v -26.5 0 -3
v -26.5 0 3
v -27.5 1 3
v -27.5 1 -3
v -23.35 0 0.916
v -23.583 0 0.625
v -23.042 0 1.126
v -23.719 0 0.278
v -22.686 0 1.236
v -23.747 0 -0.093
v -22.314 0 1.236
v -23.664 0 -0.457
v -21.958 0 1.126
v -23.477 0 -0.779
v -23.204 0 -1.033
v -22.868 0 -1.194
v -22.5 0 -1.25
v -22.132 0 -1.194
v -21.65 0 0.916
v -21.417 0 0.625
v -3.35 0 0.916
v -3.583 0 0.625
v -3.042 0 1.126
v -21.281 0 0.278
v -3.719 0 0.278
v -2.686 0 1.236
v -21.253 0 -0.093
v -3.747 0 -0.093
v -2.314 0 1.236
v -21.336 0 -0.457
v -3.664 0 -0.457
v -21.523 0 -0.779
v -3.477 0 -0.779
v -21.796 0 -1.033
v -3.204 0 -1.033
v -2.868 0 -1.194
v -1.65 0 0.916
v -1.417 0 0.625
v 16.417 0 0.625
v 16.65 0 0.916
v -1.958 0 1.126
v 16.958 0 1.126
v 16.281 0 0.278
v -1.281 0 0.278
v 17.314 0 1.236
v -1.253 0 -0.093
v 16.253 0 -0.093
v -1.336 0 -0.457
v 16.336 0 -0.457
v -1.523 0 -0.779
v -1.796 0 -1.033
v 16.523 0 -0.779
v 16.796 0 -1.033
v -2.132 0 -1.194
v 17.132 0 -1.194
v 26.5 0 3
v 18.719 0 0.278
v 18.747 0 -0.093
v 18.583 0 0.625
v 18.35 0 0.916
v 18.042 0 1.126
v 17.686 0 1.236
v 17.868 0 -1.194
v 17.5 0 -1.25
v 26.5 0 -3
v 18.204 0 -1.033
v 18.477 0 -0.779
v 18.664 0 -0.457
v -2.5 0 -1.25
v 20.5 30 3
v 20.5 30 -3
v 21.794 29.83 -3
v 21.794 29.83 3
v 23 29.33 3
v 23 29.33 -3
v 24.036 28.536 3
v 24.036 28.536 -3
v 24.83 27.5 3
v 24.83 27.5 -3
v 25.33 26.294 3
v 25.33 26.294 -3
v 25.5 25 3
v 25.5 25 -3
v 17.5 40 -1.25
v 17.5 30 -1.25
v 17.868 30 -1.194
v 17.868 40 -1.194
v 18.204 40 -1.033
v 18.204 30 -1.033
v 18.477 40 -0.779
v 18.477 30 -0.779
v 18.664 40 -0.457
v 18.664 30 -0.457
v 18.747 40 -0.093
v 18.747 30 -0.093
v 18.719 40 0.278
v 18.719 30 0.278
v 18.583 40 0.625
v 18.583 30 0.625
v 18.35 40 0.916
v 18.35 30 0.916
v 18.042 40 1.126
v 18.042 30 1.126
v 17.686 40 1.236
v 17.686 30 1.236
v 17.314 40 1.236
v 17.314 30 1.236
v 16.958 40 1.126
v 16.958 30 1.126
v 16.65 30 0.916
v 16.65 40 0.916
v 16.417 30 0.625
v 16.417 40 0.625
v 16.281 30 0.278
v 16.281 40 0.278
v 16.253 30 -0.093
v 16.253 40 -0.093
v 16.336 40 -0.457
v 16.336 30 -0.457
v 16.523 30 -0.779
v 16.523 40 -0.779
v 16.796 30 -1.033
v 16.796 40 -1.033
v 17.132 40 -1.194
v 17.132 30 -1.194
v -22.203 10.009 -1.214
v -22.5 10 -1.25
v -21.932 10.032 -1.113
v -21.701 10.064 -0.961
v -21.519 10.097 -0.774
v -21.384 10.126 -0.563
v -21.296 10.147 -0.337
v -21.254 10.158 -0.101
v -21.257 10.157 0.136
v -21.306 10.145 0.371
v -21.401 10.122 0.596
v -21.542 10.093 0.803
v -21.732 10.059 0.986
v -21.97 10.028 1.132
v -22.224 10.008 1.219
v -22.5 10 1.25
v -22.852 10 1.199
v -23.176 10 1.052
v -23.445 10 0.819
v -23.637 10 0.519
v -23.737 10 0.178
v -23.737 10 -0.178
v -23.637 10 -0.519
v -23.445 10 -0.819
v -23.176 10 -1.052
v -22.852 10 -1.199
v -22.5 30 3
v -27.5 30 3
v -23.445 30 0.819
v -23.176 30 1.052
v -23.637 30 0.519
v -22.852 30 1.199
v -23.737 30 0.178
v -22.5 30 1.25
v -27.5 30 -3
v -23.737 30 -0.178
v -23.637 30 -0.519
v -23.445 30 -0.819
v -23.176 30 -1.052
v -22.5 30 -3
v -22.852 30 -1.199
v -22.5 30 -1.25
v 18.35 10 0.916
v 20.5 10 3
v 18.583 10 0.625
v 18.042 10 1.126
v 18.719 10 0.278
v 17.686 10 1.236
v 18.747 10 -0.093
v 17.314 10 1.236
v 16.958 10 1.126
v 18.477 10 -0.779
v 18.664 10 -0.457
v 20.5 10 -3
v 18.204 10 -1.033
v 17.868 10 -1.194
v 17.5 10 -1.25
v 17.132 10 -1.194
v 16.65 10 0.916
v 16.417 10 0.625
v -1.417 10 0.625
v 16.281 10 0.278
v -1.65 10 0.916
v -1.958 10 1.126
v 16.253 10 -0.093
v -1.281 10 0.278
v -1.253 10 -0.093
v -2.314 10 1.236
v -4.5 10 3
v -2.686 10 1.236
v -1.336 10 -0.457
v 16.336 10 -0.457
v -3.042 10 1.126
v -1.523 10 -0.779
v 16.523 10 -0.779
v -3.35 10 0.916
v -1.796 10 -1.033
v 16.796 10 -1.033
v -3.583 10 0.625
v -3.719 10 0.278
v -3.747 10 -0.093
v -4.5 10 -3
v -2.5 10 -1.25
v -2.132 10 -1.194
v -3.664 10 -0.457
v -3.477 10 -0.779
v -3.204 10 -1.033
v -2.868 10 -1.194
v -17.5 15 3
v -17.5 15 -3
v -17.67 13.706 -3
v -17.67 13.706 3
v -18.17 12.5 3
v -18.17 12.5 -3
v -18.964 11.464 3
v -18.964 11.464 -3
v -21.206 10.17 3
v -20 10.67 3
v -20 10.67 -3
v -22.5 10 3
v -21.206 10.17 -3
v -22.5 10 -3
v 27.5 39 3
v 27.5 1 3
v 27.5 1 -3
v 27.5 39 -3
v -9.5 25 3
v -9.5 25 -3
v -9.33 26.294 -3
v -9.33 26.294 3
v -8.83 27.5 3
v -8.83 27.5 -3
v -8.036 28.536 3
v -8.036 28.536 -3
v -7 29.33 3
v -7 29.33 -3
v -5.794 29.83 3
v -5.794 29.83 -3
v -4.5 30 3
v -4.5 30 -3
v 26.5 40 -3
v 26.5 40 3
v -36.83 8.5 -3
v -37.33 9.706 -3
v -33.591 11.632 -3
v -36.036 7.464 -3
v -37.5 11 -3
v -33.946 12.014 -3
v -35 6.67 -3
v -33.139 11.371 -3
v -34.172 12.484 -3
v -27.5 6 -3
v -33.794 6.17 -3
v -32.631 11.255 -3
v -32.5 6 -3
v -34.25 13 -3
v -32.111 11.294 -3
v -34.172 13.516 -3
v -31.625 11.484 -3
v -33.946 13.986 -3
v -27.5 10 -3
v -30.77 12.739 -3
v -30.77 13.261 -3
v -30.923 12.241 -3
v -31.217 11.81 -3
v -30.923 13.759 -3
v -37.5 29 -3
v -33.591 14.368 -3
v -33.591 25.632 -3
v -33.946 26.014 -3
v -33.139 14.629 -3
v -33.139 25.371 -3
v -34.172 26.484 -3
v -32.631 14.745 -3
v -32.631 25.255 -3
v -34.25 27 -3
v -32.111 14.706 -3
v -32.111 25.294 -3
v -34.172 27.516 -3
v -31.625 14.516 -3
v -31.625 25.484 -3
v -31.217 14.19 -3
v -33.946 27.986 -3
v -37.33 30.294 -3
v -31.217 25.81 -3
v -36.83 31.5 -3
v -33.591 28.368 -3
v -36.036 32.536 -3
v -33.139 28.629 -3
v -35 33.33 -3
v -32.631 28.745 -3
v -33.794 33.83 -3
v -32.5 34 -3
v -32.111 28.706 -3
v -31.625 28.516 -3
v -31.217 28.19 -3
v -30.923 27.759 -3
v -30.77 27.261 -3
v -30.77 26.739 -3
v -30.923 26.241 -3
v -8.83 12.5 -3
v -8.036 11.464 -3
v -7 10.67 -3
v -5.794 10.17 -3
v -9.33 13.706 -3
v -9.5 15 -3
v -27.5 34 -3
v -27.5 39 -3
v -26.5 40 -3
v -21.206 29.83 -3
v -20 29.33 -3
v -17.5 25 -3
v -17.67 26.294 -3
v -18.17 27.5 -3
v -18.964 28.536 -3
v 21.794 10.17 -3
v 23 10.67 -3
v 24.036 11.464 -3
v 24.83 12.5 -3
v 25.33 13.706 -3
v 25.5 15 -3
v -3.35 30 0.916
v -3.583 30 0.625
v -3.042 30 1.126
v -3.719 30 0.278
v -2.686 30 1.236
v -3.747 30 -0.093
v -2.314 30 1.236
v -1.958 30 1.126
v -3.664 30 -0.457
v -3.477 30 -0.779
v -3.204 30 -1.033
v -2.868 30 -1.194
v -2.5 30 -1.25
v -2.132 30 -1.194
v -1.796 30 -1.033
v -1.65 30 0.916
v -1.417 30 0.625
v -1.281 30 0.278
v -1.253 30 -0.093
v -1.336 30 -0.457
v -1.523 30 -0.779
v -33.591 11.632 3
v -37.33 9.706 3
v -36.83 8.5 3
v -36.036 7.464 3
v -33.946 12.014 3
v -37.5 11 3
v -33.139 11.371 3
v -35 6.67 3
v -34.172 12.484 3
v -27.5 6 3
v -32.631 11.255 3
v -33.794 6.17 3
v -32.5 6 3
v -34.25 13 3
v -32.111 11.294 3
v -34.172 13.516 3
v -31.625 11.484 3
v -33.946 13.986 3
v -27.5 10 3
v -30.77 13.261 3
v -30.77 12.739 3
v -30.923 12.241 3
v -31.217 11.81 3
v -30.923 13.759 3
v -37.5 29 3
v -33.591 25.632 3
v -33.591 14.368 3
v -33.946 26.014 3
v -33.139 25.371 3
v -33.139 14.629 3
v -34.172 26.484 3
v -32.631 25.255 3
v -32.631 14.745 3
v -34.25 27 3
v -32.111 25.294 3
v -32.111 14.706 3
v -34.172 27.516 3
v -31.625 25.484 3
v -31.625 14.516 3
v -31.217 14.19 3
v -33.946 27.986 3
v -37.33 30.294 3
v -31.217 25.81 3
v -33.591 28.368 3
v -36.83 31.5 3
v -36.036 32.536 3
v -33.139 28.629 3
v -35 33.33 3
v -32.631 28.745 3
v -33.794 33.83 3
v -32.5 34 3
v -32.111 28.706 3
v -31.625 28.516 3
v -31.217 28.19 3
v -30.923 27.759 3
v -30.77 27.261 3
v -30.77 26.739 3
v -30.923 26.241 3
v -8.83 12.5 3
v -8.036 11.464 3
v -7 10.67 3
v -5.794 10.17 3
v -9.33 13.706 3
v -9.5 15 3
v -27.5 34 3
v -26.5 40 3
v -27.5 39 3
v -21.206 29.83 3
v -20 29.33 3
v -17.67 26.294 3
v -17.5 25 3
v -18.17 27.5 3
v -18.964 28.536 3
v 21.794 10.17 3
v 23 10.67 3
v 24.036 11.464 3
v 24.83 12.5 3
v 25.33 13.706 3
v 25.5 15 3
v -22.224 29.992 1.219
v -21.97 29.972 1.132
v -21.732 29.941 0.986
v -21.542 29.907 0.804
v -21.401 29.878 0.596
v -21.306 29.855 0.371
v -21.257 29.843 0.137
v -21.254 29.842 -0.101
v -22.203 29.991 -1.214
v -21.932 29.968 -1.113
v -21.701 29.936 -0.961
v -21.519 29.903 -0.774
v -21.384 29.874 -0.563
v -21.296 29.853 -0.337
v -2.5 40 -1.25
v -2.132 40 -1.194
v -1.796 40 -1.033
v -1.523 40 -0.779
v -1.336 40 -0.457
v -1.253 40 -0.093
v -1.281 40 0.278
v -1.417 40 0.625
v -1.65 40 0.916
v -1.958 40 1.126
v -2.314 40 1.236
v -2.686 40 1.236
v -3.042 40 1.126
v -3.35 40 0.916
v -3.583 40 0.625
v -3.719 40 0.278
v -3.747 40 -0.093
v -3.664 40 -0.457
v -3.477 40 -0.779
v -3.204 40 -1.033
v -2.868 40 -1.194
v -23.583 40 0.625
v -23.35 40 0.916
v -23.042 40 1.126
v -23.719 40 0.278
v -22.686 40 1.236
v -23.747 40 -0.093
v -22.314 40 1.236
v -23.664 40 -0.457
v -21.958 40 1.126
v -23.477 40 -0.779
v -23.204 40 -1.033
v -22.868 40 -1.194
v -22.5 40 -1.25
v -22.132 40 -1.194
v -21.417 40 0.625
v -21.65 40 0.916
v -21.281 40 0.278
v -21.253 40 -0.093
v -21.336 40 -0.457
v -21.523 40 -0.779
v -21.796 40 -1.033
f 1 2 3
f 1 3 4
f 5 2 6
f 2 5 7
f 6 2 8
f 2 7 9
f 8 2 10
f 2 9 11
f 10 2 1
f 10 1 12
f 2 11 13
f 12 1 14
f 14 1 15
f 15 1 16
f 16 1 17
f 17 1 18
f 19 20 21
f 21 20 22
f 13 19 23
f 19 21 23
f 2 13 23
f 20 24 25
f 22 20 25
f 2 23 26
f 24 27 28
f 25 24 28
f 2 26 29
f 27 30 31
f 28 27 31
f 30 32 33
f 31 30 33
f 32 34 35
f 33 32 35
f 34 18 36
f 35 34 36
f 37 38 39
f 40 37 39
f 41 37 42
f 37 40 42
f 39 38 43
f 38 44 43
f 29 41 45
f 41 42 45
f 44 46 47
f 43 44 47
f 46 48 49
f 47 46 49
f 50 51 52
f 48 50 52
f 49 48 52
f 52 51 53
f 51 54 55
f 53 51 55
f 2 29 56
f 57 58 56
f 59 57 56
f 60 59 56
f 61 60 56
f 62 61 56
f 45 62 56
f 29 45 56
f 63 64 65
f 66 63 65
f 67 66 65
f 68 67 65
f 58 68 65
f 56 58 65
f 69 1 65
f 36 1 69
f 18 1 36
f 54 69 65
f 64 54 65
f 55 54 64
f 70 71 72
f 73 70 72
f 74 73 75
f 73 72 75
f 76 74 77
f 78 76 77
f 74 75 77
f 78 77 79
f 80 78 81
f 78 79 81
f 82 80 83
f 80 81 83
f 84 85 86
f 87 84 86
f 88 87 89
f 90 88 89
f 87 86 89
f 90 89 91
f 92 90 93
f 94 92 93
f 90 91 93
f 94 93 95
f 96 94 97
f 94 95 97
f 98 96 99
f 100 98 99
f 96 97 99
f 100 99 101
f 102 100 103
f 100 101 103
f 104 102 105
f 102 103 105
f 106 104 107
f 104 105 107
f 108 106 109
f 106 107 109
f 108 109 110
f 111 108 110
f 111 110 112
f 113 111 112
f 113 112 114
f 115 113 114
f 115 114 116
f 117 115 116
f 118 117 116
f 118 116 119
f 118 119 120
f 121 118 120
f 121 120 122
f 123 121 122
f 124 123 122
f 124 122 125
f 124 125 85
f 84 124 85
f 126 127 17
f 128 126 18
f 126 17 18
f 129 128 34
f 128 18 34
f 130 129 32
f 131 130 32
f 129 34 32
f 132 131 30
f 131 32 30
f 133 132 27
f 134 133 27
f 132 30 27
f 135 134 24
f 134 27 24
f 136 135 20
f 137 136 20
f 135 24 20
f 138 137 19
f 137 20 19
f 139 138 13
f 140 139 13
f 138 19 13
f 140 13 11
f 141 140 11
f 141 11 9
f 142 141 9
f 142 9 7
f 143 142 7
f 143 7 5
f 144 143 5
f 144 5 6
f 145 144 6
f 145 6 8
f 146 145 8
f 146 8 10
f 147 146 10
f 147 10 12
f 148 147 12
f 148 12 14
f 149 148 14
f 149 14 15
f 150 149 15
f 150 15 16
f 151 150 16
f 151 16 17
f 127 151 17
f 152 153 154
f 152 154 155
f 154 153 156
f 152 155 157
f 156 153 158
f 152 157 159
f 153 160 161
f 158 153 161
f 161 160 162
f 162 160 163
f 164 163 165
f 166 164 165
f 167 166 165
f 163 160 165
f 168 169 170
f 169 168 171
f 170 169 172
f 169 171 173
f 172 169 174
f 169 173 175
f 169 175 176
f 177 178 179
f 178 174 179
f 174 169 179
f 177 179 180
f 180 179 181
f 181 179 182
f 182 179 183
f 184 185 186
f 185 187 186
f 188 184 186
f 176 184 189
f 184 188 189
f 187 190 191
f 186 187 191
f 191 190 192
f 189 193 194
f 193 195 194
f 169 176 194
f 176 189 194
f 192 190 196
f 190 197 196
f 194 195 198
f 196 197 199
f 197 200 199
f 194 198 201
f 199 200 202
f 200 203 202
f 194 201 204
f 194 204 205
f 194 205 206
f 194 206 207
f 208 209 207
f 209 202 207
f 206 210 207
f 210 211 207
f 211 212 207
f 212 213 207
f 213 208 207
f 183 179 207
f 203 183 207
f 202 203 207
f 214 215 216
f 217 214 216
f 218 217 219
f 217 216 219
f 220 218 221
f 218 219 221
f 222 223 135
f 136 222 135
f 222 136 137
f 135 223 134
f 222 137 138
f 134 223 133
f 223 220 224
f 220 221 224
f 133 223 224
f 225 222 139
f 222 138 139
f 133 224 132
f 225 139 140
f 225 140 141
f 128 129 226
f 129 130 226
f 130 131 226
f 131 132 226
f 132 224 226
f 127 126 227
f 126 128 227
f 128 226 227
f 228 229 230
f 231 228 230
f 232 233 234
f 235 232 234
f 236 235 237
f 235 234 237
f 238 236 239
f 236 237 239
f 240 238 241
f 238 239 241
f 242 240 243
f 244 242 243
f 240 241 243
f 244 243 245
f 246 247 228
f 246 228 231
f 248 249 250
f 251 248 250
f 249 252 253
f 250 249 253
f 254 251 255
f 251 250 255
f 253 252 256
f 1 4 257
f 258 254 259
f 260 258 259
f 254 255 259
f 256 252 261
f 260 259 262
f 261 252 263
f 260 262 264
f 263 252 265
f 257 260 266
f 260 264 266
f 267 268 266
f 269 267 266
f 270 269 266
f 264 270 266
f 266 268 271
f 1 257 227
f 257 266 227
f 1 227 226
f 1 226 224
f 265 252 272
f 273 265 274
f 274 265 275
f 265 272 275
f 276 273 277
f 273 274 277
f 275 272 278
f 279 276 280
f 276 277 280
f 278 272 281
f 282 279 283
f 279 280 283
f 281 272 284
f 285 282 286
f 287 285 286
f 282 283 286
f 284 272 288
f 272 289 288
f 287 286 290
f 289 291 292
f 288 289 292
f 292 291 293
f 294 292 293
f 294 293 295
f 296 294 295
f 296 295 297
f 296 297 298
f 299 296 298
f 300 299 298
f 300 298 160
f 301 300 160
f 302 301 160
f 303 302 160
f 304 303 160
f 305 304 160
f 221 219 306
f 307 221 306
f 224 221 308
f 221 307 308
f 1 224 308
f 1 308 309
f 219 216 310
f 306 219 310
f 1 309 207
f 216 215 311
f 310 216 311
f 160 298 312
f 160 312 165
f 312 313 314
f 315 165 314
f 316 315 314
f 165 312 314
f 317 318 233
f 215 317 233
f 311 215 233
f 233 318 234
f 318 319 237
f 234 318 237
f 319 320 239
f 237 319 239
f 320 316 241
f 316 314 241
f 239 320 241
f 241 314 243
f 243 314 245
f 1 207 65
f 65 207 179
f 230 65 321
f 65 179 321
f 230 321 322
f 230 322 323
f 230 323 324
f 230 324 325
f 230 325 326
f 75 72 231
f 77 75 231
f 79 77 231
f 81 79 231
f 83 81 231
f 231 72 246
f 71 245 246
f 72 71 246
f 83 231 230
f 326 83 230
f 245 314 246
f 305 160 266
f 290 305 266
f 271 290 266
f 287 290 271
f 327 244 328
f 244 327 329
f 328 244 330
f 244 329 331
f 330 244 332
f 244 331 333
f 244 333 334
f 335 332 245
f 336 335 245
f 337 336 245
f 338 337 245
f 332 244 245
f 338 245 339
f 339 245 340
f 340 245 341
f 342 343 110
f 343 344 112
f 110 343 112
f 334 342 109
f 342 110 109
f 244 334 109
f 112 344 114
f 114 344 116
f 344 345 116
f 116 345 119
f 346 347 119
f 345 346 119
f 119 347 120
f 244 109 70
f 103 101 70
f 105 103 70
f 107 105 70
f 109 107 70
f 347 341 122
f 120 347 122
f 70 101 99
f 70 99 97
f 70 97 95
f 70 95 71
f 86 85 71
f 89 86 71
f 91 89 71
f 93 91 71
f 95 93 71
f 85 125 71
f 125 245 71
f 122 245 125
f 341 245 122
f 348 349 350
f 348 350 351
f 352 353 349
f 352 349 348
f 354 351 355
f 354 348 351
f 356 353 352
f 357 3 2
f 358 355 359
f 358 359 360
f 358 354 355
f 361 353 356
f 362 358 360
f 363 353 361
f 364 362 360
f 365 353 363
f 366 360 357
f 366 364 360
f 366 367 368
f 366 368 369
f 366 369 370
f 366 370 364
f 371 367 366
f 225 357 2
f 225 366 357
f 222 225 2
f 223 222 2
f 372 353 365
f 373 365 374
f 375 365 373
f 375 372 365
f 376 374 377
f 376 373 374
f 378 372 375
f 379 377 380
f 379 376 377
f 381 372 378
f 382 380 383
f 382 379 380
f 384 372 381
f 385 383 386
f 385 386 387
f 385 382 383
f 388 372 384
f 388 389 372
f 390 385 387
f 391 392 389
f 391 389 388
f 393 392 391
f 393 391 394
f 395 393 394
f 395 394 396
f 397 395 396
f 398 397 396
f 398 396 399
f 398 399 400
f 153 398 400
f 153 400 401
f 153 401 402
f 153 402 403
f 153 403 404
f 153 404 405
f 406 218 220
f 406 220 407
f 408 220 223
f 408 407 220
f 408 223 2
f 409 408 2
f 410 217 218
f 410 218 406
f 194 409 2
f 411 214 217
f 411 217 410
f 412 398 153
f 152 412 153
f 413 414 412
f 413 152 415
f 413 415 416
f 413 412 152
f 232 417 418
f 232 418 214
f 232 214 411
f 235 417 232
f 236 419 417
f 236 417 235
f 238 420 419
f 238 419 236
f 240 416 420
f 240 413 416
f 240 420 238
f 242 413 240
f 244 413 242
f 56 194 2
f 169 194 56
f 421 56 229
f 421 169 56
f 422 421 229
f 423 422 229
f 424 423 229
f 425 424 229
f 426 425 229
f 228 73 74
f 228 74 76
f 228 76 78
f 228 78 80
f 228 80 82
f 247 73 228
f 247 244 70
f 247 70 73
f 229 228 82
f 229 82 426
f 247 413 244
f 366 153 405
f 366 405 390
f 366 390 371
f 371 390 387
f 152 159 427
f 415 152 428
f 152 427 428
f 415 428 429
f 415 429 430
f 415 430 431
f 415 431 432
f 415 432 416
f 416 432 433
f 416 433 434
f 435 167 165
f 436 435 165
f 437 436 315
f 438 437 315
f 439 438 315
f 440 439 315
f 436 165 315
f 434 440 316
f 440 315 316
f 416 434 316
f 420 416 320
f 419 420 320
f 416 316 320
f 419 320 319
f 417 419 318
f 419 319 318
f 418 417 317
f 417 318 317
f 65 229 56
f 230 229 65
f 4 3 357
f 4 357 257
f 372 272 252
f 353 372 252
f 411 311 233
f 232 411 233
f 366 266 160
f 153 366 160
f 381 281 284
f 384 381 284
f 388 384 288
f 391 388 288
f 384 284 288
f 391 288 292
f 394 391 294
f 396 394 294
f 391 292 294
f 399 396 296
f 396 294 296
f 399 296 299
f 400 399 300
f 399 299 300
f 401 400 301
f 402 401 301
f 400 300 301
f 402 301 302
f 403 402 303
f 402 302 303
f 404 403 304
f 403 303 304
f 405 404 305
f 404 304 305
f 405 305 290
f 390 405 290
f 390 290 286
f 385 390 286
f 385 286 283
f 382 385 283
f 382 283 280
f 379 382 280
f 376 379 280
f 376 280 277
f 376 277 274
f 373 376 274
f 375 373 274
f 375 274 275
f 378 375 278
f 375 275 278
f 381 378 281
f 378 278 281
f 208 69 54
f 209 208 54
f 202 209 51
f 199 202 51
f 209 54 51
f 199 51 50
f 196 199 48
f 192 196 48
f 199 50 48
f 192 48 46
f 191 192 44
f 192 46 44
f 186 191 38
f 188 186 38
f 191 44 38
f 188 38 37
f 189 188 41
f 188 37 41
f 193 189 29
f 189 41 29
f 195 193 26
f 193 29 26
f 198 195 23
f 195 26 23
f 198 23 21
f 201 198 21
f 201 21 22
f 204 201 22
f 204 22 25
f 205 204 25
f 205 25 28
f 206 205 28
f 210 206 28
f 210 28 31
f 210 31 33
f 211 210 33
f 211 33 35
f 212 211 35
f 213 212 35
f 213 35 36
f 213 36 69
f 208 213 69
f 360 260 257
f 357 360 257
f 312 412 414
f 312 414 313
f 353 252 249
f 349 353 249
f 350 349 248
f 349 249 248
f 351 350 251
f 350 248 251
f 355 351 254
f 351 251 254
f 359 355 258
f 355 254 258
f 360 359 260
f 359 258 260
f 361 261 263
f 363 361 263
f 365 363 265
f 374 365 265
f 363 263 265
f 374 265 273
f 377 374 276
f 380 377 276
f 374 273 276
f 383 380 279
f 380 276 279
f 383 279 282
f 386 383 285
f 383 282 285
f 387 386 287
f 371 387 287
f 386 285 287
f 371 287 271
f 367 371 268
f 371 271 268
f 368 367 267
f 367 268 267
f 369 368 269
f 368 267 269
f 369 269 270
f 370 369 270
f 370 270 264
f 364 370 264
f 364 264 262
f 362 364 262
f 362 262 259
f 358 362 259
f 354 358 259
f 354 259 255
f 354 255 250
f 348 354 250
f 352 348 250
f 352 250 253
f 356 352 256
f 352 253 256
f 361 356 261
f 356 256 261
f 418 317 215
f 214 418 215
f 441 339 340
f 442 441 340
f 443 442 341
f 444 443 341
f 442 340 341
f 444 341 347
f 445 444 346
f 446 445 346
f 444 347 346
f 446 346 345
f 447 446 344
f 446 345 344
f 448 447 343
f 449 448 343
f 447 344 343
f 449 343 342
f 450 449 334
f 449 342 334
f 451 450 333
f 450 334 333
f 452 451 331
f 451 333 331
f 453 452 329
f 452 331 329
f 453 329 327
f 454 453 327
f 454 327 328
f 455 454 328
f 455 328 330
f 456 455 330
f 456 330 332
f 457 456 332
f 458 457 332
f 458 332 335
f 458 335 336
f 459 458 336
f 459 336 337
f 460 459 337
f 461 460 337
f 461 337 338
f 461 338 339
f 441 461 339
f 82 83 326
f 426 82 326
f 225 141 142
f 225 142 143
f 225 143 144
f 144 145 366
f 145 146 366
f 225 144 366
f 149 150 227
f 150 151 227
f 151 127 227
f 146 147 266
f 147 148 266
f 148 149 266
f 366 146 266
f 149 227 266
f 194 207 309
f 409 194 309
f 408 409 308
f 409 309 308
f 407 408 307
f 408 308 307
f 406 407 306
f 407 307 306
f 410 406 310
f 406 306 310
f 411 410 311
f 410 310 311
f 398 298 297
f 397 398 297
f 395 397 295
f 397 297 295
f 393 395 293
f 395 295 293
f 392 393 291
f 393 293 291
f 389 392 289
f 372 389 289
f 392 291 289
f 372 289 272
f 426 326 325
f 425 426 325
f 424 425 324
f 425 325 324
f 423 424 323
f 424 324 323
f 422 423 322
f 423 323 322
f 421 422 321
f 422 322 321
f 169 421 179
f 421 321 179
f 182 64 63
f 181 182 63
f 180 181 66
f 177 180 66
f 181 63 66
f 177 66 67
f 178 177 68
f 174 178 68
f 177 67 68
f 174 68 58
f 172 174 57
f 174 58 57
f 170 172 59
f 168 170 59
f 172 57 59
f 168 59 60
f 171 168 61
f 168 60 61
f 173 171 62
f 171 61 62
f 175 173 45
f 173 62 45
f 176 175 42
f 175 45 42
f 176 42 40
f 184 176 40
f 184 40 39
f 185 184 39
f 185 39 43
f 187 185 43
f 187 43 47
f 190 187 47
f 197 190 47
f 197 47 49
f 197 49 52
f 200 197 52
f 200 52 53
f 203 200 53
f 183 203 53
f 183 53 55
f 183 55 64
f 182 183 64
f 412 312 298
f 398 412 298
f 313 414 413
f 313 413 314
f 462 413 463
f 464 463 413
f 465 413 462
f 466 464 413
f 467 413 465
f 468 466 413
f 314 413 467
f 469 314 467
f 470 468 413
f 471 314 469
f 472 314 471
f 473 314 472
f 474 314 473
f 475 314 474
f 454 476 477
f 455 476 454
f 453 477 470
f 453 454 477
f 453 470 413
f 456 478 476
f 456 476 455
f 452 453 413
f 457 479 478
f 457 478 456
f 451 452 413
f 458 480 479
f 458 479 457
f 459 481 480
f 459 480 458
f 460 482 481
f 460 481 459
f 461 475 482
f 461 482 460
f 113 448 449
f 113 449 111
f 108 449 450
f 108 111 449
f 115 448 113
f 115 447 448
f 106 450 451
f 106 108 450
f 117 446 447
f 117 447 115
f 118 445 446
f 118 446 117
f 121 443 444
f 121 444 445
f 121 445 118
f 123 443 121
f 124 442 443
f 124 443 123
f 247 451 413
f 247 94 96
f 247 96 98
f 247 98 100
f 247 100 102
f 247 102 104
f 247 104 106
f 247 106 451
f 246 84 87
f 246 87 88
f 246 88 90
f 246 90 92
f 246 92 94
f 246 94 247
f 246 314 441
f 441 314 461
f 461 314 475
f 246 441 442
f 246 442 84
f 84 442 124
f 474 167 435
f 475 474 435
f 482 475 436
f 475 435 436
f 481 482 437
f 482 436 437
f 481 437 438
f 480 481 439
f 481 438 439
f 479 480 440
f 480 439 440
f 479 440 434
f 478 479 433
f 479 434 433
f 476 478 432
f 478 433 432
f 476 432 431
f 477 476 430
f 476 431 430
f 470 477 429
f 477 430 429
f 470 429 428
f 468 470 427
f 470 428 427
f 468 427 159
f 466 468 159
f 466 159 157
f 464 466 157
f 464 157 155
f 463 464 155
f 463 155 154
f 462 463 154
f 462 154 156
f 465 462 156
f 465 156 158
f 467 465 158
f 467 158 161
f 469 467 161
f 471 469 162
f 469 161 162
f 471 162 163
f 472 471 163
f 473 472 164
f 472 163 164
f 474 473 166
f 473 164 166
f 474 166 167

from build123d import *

# Parameters (mm, degrees)
SKETCH1_W           = 55
SKETCH1_H           = 6
BOSS_EXTRUDE1_DEPTH = 40
M3_TAPPED_HOLE1_D   = 2.5
CUT_EXTRUDE1_DEPTH  = 40
CHAMFER1_SIZE       = 1
SKETCH9_R           = 1.75
BOSS_EXTRUDE4_DEPTH = 6


with BuildPart() as part:
    # Sketch1 → Boss-Extrude1 (new body)
    with BuildSketch(Plane(origin=(0, 0, 0), x_dir=(1, 0, 0), z_dir=(0, 1, 0))):
        Rectangle(SKETCH1_W, SKETCH1_H)
    extrude(amount=BOSS_EXTRUDE1_DEPTH)

    # M3 Tapped Hole1 (through all)
    with Locations(Plane(origin=(-22.5, 40, 0), x_dir=(0, 0, 1), z_dir=(0, 1, 0))):
        with Locations((0, 0), (0, 20), (0, 40)):
            Hole(M3_TAPPED_HOLE1_D / 2)

    # Sketch7 → Cut-Extrude1 (cut)
    with BuildSketch(Plane(origin=(0, 0, -3), x_dir=(-1, 0, 0), z_dir=(0, 0, -1))):
        with BuildLine():
            Line((27.5, 30), (22.5, 30))
            ThreePointArc((22.5, 30), (18.964466094, 28.535533906), (17.5, 25))
            Line((17.5, 25), (17.5, 15))
            ThreePointArc((17.5, 15), (18.964466094, 11.464466094), (22.5, 10))
            Line((22.5, 10), (27.5, 10))
            Line((27.5, 10), (27.5, 30))
        make_face()
        with BuildLine():
            Line((4.5, 30), (-20.5, 30))
            ThreePointArc((-20.5, 30), (-24.035533906, 28.535533906), (-25.5, 25))
            Line((-25.5, 25), (-25.5, 15))
            ThreePointArc((-25.5, 15), (-24.035533906, 11.464466094), (-20.5, 10))
            Line((-20.5, 10), (4.5, 10))
            ThreePointArc((4.5, 10), (8.035533906, 11.464466094), (9.5, 15))
            Line((9.5, 15), (9.5, 25))
            ThreePointArc((9.5, 25), (8.035533906, 28.535533906), (4.5, 30))
        make_face()
    extrude(amount=-CUT_EXTRUDE1_DEPTH, mode=Mode.SUBTRACT)

    # Chamfer1
    chamfer1_edges = [part.edges().sort_by_distance(p)[0] for p in [
        (-27.5, 40, 0),
        (27.5, 40, 0),
        (-27.5, 0, 0),
        (27.5, 0, 0),
    ]]
    chamfer(chamfer1_edges, length=CHAMFER1_SIZE)

    # Sketch9 → Boss-Extrude4 (add)
    with BuildSketch(Plane(origin=(0, 0, -3), x_dir=(-1, 0, 0), z_dir=(0, 0, -1))):
        with BuildLine():
            Line((27.5, 34), (32.5, 34))
            ThreePointArc((32.5, 34), (36.035533906, 32.535533906), (37.5, 29))
            Line((37.5, 29), (37.5, 11))
            ThreePointArc((37.5, 11), (36.035533906, 7.464466094), (32.5, 6))
            Line((32.5, 6), (27.5, 6))
            Line((27.5, 6), (27.5, 34))
        make_face()
        with Locations((32.5, 27)):
            Circle(SKETCH9_R, mode=Mode.SUBTRACT)
        with Locations((32.5, 13)):
            Circle(SKETCH9_R, mode=Mode.SUBTRACT)
    extrude(amount=-BOSS_EXTRUDE4_DEPTH)


solid = part.part
